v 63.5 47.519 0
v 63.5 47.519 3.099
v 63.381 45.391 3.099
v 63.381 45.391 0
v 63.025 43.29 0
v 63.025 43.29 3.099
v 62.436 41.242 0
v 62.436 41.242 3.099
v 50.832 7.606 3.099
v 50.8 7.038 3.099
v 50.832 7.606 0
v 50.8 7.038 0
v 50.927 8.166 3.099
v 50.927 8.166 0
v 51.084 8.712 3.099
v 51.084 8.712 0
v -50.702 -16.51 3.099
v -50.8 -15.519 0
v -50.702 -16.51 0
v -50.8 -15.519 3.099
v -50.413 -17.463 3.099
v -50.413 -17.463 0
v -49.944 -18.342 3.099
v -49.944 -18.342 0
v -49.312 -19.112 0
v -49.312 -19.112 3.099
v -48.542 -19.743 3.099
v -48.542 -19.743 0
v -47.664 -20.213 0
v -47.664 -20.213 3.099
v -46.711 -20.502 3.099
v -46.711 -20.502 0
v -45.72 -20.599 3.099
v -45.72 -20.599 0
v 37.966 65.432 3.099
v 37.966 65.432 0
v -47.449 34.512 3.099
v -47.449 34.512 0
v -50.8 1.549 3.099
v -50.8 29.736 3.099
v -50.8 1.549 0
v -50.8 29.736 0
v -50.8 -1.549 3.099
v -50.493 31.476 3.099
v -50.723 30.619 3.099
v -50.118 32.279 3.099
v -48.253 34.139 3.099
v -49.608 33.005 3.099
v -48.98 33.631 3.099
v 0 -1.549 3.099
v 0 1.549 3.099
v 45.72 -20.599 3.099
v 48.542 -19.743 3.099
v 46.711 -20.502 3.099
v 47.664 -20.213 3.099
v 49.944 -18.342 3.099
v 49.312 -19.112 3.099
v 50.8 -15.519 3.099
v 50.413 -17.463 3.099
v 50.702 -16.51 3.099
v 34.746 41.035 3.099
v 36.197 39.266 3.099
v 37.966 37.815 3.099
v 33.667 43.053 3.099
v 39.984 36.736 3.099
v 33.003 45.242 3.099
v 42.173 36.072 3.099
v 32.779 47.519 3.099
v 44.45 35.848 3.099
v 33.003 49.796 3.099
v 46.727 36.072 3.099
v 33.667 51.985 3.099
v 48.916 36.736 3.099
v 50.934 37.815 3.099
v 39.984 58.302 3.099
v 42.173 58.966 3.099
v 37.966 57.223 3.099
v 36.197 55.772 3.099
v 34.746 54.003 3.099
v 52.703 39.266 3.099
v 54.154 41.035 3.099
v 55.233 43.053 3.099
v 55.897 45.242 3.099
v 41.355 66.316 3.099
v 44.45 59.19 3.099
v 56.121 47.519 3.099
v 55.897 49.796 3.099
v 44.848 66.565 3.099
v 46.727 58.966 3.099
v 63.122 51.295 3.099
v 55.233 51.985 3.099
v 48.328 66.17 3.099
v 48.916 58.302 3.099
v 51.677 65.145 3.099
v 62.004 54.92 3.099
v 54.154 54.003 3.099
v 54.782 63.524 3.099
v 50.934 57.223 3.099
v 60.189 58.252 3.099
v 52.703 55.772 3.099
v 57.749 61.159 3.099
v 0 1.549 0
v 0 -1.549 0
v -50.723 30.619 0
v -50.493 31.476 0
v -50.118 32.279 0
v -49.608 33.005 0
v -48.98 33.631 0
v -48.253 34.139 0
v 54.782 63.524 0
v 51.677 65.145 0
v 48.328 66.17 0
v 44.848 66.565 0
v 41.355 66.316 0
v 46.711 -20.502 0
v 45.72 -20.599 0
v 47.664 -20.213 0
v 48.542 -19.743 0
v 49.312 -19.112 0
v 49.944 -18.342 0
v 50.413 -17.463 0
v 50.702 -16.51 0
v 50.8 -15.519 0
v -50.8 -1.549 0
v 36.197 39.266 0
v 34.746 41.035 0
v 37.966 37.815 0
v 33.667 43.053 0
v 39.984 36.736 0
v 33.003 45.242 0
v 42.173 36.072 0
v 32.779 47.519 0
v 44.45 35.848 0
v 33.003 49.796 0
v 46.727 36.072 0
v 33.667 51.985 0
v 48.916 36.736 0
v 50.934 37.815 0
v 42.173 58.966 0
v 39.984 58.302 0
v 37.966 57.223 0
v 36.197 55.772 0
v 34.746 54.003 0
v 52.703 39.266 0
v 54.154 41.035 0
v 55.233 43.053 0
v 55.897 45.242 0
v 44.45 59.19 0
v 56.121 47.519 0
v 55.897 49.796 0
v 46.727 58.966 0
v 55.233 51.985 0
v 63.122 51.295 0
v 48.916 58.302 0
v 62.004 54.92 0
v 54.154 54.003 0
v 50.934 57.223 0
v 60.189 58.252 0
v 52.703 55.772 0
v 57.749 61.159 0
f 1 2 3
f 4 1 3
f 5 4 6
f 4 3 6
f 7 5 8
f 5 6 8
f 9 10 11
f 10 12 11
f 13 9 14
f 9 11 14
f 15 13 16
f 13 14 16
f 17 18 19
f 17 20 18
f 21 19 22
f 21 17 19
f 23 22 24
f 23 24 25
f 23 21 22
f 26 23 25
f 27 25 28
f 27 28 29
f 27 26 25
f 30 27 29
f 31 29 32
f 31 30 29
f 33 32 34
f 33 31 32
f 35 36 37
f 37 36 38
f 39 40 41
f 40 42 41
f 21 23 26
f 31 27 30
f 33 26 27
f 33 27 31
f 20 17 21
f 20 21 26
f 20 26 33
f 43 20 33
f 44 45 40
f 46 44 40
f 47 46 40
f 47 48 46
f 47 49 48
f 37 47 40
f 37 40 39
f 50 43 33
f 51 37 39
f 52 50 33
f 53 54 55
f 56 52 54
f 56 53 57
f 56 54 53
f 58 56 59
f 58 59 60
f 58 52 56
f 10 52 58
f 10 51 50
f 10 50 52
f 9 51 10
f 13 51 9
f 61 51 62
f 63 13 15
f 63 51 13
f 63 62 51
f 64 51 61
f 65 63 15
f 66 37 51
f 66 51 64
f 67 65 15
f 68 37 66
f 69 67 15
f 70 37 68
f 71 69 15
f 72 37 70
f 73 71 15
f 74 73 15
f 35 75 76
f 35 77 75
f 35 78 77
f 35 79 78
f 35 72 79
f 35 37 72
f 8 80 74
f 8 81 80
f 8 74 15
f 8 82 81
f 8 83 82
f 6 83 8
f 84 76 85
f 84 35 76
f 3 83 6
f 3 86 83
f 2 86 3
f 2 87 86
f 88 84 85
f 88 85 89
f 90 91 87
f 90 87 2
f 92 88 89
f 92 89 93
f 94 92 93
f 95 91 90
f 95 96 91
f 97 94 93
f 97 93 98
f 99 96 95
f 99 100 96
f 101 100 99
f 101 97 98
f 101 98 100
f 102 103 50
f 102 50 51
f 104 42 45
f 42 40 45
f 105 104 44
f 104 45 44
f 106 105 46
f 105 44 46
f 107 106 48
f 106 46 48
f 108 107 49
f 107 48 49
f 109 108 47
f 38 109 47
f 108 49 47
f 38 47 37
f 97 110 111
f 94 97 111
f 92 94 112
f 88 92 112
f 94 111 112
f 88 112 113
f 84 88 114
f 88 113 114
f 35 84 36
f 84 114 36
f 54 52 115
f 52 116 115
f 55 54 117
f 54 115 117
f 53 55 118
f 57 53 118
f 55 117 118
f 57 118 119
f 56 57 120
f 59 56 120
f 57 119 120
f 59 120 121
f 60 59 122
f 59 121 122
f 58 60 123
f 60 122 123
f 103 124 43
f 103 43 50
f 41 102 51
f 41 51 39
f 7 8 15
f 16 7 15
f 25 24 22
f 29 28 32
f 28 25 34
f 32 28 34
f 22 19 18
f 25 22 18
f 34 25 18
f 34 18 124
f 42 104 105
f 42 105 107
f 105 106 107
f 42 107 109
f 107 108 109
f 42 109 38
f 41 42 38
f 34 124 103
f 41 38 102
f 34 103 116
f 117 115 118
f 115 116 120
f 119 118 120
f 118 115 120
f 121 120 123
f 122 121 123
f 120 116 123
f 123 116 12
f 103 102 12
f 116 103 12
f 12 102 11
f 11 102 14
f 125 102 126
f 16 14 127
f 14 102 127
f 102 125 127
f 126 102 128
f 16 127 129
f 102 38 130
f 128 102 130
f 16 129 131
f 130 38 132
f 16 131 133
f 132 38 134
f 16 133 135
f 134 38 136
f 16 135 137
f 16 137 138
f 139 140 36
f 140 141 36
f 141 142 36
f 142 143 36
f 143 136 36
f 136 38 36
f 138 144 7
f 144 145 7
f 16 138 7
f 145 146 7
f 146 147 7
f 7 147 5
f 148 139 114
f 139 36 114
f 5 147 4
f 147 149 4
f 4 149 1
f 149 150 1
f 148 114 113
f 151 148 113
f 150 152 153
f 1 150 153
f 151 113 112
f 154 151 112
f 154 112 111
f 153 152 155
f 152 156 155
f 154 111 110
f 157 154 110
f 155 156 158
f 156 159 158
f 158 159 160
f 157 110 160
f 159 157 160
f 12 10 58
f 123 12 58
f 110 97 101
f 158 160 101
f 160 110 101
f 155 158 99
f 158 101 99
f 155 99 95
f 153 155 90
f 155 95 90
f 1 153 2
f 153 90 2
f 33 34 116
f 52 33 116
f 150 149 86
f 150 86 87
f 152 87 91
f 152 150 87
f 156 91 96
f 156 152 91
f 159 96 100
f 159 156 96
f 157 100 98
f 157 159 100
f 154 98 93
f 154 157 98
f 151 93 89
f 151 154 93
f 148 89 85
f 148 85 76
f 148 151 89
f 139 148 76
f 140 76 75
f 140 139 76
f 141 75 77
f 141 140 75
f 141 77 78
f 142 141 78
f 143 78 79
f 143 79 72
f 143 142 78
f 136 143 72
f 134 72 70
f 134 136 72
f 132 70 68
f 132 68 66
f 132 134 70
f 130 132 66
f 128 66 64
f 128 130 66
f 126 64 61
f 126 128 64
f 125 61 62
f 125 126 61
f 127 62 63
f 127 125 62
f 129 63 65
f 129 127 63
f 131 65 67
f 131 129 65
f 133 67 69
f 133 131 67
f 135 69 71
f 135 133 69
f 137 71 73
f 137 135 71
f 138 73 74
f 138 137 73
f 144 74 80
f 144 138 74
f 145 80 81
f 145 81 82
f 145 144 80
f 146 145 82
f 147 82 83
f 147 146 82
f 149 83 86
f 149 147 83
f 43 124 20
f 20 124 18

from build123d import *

# Parameters (mm, degrees)
BOSS_EXTRUDE1_DEPTH = 3.0988
SKETCH3_R           = 1.0795
SKETCH3_R_2         = 11.6713
BOSS_EXTRUDE2_DEPTH = 3.0988
SKETCH4_R           = 1.0795
CUT_EXTRUDE1_DEPTH  = 122.505558808
FILLET1_R           = 5.08


with BuildPart() as part:
    # Sketch2 → Boss-Extrude1 (new body)
    with BuildSketch(Plane.XY):
        Polygon((-50.8, 1.5494), (-50.8, 7.8994), (50.8, 7.8994), (50.8, -7.8994), (-50.8, -7.8994), (-50.8, -1.5494), (0, -1.5494), (0, 1.5494), align=None)
    extrude(amount=BOSS_EXTRUDE1_DEPTH)

    # Sketch3 → Boss-Extrude2 (add)
    with BuildSketch(Plane.XY):
        with BuildLine():
            Line((50.8, -7.8994), (-50.8, -7.8994))
            Line((-50.8, -7.8994), (-50.8, -20.5994))
            Line((-50.8, -20.5994), (101.6, -20.5994))
            Line((101.6, -20.5994), (101.6, 33.2994))
            Line((101.6, 33.2994), (54.782161872, 63.523702231))
            ThreePointArc((54.782161872, 63.523702231), (46.597523005, 66.447615713), (37.96588061, 65.431577828))
            Line((37.96588061, 65.431577828), (-50.8, 33.2994))
            Line((-50.8, 33.2994), (-50.8, 7.8994))
            Line((-50.8, 7.8994), (50.8, 7.8994))
            Line((50.8, 7.8994), (50.8, -7.8994))
        make_face()
        with Locations((76.2, 0)):
            Circle(SKETCH3_R, mode=Mode.SUBTRACT)
        with Locations((44.45, 47.519048812)):
            Circle(SKETCH3_R_2, mode=Mode.SUBTRACT)
    extrude(amount=BOSS_EXTRUDE2_DEPTH)

    # Sketch4 → Cut-Extrude1 (cut, through all)
    with BuildSketch(Plane.XY.offset(3.0988)):
        with BuildLine():
            ThreePointArc((63.5, 47.519048812), (63.232160807, 44.33582161), (62.436174759, 41.242105484))
            Line((62.436174759, 41.242105484), (50.8, 7.8994))
            Line((50.8, 7.8994), (50.8, -20.5994))
            Line((50.8, -20.5994), (101.6, -20.5994))
            Line((101.6, -20.5994), (101.6, 33.2994))
            Line((101.6, 33.2994), (54.782161872, 63.523702231))
            ThreePointArc((54.782161872, 63.523702231), (61.179168892, 56.6315352), (63.5, 47.519048812))
        make_face()
        with Locations((76.2, 0)):
            Circle(SKETCH4_R, mode=Mode.SUBTRACT)
    extrude(amount=-CUT_EXTRUDE1_DEPTH, mode=Mode.SUBTRACT)

    # Fillet1
    fillet1_edges = [part.edges().sort_by_distance(p)[0] for p in [
        (-50.8, -20.5994, 1.5494),
        (-50.8, 33.2994, 1.5494),
        (50.8, 7.8994, 1.5494),
        (50.8, -20.5994, 1.5494),
    ]]
    fillet(fillet1_edges, radius=FILLET1_R)


solid = part.part
